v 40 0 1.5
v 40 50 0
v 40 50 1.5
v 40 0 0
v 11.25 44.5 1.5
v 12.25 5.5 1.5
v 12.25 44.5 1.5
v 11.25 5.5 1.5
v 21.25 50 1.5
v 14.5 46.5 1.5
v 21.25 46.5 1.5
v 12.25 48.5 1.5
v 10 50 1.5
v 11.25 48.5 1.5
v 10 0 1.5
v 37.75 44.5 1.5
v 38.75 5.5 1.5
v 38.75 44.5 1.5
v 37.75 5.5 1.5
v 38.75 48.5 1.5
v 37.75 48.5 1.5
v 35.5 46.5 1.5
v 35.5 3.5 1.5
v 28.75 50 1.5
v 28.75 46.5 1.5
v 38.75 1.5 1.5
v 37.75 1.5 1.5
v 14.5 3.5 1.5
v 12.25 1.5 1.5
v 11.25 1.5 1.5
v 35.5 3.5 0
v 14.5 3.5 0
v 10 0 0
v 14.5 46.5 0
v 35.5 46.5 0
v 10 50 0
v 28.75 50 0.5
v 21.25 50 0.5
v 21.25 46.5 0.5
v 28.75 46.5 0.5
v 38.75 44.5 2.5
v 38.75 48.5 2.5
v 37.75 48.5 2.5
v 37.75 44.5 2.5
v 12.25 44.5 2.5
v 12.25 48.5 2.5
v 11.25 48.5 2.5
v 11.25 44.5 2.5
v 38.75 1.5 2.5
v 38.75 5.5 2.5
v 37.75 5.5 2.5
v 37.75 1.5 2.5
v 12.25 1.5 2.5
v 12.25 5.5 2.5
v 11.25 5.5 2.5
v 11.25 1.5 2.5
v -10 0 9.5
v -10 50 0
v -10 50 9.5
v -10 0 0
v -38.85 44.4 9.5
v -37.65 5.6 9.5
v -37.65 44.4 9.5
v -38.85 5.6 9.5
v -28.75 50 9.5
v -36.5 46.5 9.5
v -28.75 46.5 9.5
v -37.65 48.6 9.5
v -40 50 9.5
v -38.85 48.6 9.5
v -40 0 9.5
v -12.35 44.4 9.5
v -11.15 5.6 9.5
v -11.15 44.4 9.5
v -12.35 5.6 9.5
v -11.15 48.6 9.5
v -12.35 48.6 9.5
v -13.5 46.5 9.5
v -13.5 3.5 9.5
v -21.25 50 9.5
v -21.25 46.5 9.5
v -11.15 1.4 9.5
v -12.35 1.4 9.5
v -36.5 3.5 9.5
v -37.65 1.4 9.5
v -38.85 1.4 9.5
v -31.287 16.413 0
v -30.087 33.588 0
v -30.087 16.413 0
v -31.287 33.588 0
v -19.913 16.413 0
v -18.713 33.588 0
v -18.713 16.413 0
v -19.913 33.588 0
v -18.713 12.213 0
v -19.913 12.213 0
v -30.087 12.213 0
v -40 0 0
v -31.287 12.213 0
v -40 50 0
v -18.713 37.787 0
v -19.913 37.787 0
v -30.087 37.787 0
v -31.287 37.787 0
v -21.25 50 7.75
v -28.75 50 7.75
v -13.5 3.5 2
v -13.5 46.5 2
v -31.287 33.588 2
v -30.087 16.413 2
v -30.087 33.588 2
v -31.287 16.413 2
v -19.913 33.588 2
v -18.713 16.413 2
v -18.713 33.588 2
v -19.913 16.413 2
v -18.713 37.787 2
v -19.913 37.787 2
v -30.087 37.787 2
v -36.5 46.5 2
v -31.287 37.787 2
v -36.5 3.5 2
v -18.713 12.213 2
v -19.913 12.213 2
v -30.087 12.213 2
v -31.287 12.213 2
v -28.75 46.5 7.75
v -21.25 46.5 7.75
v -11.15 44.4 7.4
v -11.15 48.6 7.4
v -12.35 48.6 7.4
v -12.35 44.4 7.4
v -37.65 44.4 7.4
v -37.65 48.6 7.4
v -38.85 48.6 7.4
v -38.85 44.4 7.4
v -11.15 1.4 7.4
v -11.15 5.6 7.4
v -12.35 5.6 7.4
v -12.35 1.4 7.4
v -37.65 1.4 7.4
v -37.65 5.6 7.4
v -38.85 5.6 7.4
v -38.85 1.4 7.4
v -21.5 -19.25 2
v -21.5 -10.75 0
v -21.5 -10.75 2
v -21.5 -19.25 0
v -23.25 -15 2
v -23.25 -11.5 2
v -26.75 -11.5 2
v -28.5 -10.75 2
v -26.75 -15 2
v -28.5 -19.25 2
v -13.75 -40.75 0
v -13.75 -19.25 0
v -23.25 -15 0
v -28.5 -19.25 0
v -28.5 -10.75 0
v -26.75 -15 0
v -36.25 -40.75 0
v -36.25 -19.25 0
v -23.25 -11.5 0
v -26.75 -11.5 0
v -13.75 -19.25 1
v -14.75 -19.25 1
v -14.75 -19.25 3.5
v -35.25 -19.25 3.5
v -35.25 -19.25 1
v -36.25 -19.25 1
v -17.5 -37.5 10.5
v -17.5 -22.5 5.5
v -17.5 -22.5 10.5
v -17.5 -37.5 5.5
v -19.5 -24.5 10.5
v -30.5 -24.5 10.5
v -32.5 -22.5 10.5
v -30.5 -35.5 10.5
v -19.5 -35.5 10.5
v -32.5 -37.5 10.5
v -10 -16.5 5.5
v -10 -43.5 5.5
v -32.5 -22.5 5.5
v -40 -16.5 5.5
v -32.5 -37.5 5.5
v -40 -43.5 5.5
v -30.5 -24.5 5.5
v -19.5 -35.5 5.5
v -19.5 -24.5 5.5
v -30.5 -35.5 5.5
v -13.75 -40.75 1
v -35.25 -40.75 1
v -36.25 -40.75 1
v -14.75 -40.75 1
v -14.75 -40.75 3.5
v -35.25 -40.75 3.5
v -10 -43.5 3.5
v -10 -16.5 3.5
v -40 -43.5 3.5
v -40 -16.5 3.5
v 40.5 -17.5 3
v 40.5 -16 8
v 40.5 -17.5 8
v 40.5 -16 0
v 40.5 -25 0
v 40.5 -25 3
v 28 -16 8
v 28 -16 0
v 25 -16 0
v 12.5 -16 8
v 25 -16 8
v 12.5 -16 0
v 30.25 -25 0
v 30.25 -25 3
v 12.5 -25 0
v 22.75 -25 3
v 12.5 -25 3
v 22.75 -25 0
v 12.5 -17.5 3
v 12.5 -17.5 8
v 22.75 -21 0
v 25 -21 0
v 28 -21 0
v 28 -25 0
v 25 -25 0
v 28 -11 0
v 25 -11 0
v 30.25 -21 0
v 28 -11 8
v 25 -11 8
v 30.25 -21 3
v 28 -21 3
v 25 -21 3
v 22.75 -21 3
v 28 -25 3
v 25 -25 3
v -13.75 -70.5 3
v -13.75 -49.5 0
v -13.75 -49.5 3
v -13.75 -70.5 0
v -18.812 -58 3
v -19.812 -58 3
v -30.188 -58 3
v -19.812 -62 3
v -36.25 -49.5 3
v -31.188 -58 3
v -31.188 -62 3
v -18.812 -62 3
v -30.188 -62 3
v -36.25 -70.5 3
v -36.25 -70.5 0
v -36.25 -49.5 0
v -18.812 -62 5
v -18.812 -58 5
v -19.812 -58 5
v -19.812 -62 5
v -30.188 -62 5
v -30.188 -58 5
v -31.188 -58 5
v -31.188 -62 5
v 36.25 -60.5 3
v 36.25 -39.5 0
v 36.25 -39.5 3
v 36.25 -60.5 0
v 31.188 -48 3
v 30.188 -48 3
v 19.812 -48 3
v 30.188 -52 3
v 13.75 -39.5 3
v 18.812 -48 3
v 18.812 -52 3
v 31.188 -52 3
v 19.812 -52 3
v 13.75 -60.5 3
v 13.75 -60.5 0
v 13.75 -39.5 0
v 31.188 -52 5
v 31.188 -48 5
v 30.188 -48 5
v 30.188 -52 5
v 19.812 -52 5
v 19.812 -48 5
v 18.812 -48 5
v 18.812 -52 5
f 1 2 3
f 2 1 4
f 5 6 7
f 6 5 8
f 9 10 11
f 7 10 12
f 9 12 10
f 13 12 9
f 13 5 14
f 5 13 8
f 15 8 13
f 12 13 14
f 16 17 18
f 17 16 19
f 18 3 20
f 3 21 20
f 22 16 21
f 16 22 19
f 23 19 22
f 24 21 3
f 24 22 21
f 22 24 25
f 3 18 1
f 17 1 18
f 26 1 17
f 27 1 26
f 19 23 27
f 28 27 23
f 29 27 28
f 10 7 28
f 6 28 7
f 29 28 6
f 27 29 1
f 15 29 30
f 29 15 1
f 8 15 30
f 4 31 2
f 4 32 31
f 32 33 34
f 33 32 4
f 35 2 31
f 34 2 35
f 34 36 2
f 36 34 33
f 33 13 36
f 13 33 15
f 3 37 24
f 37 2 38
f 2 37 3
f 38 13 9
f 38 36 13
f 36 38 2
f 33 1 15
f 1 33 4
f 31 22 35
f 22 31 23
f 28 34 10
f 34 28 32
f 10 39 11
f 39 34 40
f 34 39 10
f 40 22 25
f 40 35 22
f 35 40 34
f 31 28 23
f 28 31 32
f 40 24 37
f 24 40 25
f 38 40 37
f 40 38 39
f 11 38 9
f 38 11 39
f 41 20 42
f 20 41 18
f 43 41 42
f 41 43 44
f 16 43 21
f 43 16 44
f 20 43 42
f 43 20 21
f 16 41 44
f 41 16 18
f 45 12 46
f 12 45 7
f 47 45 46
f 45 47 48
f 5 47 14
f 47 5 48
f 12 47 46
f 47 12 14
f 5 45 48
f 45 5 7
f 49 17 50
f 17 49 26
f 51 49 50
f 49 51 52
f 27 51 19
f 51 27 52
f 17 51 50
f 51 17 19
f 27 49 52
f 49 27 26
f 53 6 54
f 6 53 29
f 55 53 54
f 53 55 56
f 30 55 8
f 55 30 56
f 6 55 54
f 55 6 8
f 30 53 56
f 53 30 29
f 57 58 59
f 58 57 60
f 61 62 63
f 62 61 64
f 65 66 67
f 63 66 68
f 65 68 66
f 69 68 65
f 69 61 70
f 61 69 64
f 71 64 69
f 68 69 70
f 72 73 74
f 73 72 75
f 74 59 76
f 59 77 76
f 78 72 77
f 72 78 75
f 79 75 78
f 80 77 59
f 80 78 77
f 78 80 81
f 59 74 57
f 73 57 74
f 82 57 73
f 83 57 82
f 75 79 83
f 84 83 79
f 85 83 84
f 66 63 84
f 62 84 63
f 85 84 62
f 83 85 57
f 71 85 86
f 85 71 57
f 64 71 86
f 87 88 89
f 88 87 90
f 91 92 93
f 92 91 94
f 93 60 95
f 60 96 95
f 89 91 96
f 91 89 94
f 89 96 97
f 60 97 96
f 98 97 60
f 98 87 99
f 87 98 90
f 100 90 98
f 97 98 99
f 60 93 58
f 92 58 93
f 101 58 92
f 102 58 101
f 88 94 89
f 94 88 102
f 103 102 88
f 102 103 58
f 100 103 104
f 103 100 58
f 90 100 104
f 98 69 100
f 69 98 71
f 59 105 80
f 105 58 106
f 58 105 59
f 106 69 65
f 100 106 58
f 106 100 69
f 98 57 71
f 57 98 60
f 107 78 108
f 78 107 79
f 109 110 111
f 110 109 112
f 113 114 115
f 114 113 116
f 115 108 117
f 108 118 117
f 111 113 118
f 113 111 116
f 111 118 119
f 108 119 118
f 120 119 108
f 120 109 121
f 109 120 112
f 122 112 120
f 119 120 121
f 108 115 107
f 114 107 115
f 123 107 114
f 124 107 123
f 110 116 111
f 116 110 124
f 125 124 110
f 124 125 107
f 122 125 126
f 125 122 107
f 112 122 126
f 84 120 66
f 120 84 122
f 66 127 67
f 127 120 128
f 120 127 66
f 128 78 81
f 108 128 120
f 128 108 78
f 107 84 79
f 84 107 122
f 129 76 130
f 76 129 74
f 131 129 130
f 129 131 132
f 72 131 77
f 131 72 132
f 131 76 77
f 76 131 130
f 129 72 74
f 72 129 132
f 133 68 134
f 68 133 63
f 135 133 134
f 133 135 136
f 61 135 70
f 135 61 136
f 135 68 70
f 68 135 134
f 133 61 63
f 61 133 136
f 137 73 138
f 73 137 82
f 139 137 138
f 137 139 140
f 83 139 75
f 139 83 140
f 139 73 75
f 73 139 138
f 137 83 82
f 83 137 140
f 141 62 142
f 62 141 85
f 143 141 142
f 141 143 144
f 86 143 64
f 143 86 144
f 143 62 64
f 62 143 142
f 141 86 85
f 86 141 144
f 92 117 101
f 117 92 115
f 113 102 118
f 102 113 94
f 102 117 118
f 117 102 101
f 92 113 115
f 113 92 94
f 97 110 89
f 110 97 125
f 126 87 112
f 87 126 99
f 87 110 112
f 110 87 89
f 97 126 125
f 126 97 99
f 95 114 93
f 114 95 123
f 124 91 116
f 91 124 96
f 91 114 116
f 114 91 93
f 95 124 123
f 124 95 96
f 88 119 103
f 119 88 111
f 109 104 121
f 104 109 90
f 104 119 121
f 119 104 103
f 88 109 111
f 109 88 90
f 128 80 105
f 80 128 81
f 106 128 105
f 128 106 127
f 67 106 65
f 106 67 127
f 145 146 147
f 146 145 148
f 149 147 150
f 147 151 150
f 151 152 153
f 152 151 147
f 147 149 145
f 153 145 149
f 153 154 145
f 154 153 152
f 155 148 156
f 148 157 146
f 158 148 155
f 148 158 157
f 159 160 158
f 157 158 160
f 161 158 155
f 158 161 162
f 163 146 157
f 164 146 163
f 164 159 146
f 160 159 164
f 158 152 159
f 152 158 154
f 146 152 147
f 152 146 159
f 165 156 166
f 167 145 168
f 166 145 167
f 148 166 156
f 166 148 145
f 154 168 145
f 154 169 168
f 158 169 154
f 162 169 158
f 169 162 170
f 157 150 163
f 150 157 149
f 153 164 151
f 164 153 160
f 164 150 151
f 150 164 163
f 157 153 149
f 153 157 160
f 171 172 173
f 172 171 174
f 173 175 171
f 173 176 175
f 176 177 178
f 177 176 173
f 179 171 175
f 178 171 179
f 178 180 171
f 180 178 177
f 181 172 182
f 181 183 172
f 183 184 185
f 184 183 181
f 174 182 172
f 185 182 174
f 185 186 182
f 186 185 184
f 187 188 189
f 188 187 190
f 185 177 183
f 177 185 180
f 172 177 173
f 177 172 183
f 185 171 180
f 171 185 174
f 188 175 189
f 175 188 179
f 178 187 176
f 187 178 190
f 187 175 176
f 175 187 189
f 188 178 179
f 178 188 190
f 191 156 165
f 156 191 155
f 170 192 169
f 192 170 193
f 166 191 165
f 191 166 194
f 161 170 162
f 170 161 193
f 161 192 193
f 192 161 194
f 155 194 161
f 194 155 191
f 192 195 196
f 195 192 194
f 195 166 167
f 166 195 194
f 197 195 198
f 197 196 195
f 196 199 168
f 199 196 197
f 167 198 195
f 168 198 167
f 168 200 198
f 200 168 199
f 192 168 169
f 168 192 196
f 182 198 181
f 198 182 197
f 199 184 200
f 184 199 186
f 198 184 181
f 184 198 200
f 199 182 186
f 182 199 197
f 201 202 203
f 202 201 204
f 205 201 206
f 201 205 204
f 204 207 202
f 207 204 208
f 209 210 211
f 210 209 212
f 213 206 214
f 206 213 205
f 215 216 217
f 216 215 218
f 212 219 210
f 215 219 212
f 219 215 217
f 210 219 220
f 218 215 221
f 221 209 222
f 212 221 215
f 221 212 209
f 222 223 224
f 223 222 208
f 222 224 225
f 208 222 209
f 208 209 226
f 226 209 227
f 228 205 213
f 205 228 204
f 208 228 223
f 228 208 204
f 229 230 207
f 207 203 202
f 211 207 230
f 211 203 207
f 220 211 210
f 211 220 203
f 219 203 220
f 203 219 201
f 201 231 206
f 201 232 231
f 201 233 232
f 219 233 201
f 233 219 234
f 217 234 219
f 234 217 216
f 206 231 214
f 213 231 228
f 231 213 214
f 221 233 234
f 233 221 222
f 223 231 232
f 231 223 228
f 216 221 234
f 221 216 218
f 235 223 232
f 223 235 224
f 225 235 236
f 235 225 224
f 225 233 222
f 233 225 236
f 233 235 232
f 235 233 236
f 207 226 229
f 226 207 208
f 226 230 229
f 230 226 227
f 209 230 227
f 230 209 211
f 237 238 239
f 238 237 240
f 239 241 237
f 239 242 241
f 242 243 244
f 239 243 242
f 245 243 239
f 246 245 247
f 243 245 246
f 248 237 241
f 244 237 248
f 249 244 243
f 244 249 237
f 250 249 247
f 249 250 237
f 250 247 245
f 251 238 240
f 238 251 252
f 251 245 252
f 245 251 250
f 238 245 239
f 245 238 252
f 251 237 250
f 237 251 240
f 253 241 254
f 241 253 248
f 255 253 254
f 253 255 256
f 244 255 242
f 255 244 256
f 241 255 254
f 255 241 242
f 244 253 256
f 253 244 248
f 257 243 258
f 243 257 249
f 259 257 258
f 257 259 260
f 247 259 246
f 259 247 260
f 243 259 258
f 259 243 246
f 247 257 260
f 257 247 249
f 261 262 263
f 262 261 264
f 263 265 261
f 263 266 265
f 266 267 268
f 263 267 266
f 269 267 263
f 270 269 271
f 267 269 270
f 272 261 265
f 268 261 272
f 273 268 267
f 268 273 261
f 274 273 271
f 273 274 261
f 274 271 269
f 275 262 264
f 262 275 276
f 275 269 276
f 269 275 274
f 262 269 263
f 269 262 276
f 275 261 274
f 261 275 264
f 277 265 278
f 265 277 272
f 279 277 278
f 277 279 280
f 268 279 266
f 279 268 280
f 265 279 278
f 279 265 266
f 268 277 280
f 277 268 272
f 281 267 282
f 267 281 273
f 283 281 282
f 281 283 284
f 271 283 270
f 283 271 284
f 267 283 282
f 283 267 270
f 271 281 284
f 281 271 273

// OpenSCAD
$fn = 50;// number of fragments

//general specifications
signal_width = 30;
signal_depth = 50;
signal_height = 11;
magent_d = 5;
magnet_height = 3;

//cover specifications
cover_height = 1.5;
frame_width = 4.5;
frame_overhang = 1;

//body specification
body_height = signal_height-cover_height;
wall_thickness = frame_width-frame_overhang; //if the wall has to be thicker, the frame has to become thicker too
ground_thickness = 2;
cavity_width = signal_width-2*wall_thickness;
cavity_depth = signal_depth-2*wall_thickness;
cavity_height = body_height-ground_thickness;
lock_passage_y = (signal_depth-wall_thickness)/2;

//control specifications
move_tolerance = 0.5;
bottom_width = cavity_width-move_tolerance;
bottom_depth = cavity_depth/2;
bottom_h = 1;
groove_width = signal_width-2*frame_width-move_tolerance;
//groove_depth = (signal_depth/2)-2*frame_width-move_tolerance;
groove_h = cover_height+1; //higher, because the print support remains a bit
top_width = signal_width;
top_depth = (signal_depth/2)+2*frame_overhang;
top_h = 2;
lock_width = 7;
lock_depth = wall_thickness+5;
lock_heigth = 2; // has to be < bottom_h+cover_height
lockpin_d = 3;

//connecting pins specification
pin_width = 1;
pin_depth = 4;
pin_height = 2;
hole_tolerance = 0.2;

pinA_x = (signal_width-wall_thickness)/2; //wall_thicknes has to be >= 3.5mm
pinA_y = ((signal_depth/2)-wall_thickness);
pin_z = (cover_height/2);
pin_hole_z = (body_height-pin_height)/2;

//stopper specification
stopper_top_thickness = 1.5;
stopper_side_thickness = lockpin_d;
stopper_overhang = 2;
stopper_width = signal_width-2;
stopper_depth = 5+stopper_side_thickness;
stopper_height = bottom_h+groove_h+top_h+stopper_top_thickness+stopper_overhang;

//color block specification
c_block_width = cavity_width-move_tolerance;
c_block_depth = cavity_depth/2 - move_tolerance;
c_block_height = cavity_height-bottom_h-groove_h-2*move_tolerance; // has to be < cavity_height-bottom_h-groove_h-2*move_tolerance

module equ_triangle(side_length,corner_radius,signal_triangle_height){
    // copy from https://www.youtube.com/watch?v=5hDB8Nsd688
    translate([0,corner_radius]){
    hull(){
        cylinder(r=corner_radius,h=signal_triangle_height);
     rotate([0,0,60])translate([side_length-corner_radius*2,0,0])cylinder(r=corner_radius,h=signal_triangle_height);   
         rotate([0,0,120])translate([side_length-corner_radius*2,0,0])cylinder(r=corner_radius,h=signal_triangle_height);
        };
};
};

module pin(hole = false){
    if (hole==false){
        cube([pin_width, pin_depth, pin_height], center = true);
    };
    if (hole==true){
        cube([pin_width+hole_tolerance, pin_depth+hole_tolerance, pin_height+hole_tolerance],center = true);
    };
};




module cover(){
    union(){
        difference(){
            cube([signal_width, signal_depth, cover_height], center = true);
            cube([signal_width-2*frame_width, cavity_depth, cover_height], center = true);
            //lock passage
            translate([0,lock_passage_y,(cover_height-(lock_heigth-bottom_h))/2])cube([lock_width+move_tolerance,wall_thickness,lock_heigth-bottom_h], center=true);
        };
        translate([pinA_x,pinA_y,pin_z]) pin();
        translate([-pinA_x,pinA_y,pin_z]) pin();
        translate([pinA_x,-pinA_y,pin_z]) pin();
        translate([-pinA_x,-pinA_y,pin_z]) pin();
    };
    
};

module body(){
    difference(){
        union(){
            difference(){
                cube([signal_width, signal_depth, body_height], center=true);
                translate([0,0,ground_thickness/2]) cube([cavity_width, cavity_depth, cavity_height], center    =true);
            };
        };
        translate([pinA_x,pinA_y,pin_hole_z]) pin(hole=true);
        translate([-pinA_x,pinA_y,pin_hole_z]) pin(hole=true);
        translate([pinA_x,-pinA_y,pin_hole_z]) pin(hole=true);
        translate([-pinA_x,-pinA_y,pin_hole_z]) pin(hole=true);
        // color block pin
        translate([(cavity_width-move_tolerance/2)/4,(cavity_depth-move_tolerance/2)/4, -pin_hole_z]) pin(hole=true);
        translate([-(cavity_width-move_tolerance/2)/4,-(cavity_depth-move_tolerance/2)/4, -pin_hole_z]) pin(hole=true);
        translate([(cavity_width-move_tolerance/2)/4,-(cavity_depth-move_tolerance/2)/4, -pin_hole_z]) pin(hole=true);
        translate([-(cavity_width-move_tolerance/2)/4,(cavity_depth-move_tolerance/2)/4, -pin_hole_z]) pin(hole=true);
        //lock passage
        translate([0,lock_passage_y,(body_height-(bottom_h+move_tolerance))/2]) cube([lock_width+move_tolerance,wall_thickness,bottom_h+2*move_tolerance], center=true);
    };
};


module control(type){
    side_length = signal_depth/2-10;
    //bottom
    translate([0,0,bottom_h/2]) cube([bottom_width, bottom_depth, bottom_h], center=true);
    //lock
    difference(){
        translate([0,(bottom_depth+lock_depth)/2,lock_heigth/2]) cube([lock_width, lock_depth, lock_heigth],center=true);
        translate([0,bottom_depth/2+wall_thickness+lockpin_d/2+1,lock_heigth/2]) cube([lockpin_d+move_tolerance, lockpin_d+move_tolerance, lock_heigth],center=true);
    };
    //groove
    translate([0,0,bottom_h+(groove_h/2)]) cube([groove_width, bottom_depth, groove_h], center=true);
    //top
    translate([0,0,bottom_h+groove_h+(top_h/2)]) cube([top_width, top_depth, top_h], center=true);
    //handle
    //translate([0,0,bottom_h+groove_h+top_h+5]) cube([signal_width-8, 3, 10], center=true);
    if(type=="main"){
        translate([0,0,bottom_h+groove_h+top_h+2.5]) difference(){
          cube([side_length, side_length, 5], center=true);
          cube([side_length-4, side_length-4, 5], center=true);  
      }; 
    };
    if(type=="distant"){
        difference(){    
          rotate([0,0,180]) translate([0,-side_length/2,bottom_h+groove_h+top_h]) equ_triangle(side_length, 0.5, 5);
          rotate([0,0,180]) translate([0,-(side_length-4)/2,bottom_h+groove_h+top_h]) equ_triangle(side_length-4, 0.5, 5);
        };
    };
};


module stopper(){
    difference(){
        cube([stopper_width,stopper_depth,stopper_height]);
        cube([stopper_width,stopper_depth-stopper_side_thickness, stopper_height-stopper_top_thickness]);
        translate([(stopper_width-(lock_width+move_tolerance))/2,stopper_depth-stopper_side_thickness,0]) cube([lock_width+move_tolerance, stopper_side_thickness, lock_heigth+stopper_overhang]);//
    };
    //pin
    translate([stopper_width/2, stopper_depth-lockpin_d/2, (lock_heigth+stopper_overhang)/2]) cube([lockpin_d, lockpin_d, lock_heigth+stopper_overhang], center=true);
    //handle
    translate([(stopper_width-3)/2,0,stopper_height]) cube([3, stopper_depth, 5]);
};


module color_block(){
    cube([c_block_width, c_block_depth, c_block_height], center=true);
    translate([(cavity_width-move_tolerance/2)/4,0,(c_block_height+pin_height)/2]) pin();
    translate([-(cavity_width-move_tolerance/2)/4,0,(c_block_height+pin_height)/2]) pin();
    
};
//color_block();
//control("distant");
//cover();

//display objects
position = 25;
translate([position, position, cover_height/2]) cover();
translate([-position, position, body_height/2]) body();
translate([-position,-position-5,0]) control("main"); //translate Z=bottom_h+groove_h+top_h
translate([position/2, -position,stopper_depth]) rotate([-90,0,0]) stopper();
translate([-position, -2*position-10,c_block_height/2]) color_block();
translate([position, -2*position,c_block_height/2]) color_block();



    
